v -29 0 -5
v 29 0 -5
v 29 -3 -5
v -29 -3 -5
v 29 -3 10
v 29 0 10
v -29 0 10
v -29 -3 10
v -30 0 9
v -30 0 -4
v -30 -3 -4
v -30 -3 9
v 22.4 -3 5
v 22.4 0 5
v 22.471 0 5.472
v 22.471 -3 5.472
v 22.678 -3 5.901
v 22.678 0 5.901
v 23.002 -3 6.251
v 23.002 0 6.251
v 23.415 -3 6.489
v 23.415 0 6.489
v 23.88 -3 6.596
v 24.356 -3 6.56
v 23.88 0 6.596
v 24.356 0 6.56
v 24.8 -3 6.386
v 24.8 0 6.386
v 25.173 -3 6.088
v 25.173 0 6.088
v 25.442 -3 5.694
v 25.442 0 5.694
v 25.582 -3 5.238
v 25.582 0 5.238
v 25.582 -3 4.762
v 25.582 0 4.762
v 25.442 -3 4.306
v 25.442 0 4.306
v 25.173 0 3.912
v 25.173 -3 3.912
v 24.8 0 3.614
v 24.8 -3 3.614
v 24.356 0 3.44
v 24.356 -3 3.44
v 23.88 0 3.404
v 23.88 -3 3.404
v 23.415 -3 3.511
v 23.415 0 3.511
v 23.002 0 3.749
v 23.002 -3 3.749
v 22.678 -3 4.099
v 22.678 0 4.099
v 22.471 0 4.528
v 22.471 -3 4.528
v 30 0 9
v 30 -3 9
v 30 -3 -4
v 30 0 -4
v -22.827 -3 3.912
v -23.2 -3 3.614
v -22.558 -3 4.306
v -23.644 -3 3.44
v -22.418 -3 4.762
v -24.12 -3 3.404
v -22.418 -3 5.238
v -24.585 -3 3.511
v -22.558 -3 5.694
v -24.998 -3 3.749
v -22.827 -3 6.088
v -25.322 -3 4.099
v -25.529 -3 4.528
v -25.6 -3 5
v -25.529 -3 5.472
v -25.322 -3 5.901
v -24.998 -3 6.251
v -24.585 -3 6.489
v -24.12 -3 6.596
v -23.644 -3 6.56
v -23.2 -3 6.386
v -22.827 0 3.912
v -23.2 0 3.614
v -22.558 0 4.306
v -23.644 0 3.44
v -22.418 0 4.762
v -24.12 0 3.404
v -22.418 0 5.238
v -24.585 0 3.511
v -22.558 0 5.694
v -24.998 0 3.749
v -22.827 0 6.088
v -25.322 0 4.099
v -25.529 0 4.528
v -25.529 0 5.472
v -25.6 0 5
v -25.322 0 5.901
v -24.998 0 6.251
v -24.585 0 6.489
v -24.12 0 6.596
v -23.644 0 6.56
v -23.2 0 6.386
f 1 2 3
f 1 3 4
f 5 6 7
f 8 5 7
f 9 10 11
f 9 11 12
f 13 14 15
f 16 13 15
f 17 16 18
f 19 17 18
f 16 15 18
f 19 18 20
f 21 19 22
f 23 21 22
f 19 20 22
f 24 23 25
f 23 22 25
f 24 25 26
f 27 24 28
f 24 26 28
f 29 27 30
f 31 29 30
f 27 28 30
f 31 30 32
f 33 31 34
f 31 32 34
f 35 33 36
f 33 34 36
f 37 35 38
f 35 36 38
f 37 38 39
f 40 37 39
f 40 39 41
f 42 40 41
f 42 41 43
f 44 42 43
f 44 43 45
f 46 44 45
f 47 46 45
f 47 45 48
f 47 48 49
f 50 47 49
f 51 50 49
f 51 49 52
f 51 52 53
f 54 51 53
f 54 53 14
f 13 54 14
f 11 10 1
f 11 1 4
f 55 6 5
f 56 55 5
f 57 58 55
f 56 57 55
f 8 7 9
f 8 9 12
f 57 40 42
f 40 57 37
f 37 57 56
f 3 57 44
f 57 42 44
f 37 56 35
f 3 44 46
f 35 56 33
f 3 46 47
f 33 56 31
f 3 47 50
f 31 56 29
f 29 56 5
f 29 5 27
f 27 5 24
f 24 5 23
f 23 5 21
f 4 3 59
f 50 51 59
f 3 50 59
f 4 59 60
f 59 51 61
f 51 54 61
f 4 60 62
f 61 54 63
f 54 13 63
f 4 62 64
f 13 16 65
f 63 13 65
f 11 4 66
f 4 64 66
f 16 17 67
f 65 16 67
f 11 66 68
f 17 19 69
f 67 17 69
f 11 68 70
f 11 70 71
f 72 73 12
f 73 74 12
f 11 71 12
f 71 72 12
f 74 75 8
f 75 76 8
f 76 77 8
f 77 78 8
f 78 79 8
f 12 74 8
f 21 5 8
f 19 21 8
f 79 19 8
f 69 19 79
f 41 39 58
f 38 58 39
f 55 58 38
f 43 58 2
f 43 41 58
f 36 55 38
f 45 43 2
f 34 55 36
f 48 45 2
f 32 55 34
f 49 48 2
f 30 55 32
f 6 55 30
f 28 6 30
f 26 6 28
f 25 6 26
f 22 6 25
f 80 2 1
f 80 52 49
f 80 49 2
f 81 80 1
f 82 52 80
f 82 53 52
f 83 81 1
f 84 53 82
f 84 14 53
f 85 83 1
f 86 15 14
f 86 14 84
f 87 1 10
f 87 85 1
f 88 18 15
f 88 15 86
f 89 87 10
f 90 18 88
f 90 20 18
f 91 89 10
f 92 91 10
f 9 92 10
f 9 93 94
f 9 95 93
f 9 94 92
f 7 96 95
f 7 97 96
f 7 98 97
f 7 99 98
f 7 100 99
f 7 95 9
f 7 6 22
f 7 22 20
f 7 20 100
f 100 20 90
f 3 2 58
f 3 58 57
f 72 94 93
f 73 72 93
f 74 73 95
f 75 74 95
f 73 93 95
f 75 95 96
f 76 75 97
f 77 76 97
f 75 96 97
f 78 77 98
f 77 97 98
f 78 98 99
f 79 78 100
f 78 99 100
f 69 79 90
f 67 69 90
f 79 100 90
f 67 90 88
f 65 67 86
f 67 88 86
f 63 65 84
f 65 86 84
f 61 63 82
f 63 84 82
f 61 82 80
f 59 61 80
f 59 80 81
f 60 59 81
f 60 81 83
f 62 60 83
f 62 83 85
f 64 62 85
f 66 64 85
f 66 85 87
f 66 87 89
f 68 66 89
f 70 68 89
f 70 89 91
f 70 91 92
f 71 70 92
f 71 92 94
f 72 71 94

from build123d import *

# Parameters (mm, degrees)
SKETCH001_W             = 60
SKETCH001_H             = 15
PAD001_DEPTH            = 3
CHAMFER_SIZE            = 1
SKETCH005_R             = 1.6
POCKET002_DEPTH         = 3.001
BODY001_PLACEMENT_ANGLE = 90.00001


with BuildPart() as part:
    # Sketch001 → Pad001 (new body)
    with BuildSketch(Plane.YZ):
        with Locations((0, 2.5)):
            Rectangle(SKETCH001_W, SKETCH001_H)
    extrude(amount=-PAD001_DEPTH)

    # Chamfer
    chamfer_edges = [part.edges().sort_by_distance(p)[0] for p in [
        (-1.5, 30, 10),
        (-1.5, -30, 10),
        (-1.5, -30, -5),
        (-1.5, 30, -5),
    ]]
    chamfer(chamfer_edges, length=CHAMFER_SIZE)

    # Sketch005 → Pocket002 (cut, through all)
    with BuildSketch(Plane.YZ):
        with Locations((-24, 5)):
            Circle(SKETCH005_R)
        with Locations((24, 5)):
            Circle(SKETCH005_R)
    extrude(amount=-POCKET002_DEPTH, mode=Mode.SUBTRACT)


with BuildPart() as part_1:
    # Body001 placement: moved
    add(part.part.rotate(Axis((0, 0, 0), (0, 0, 1)), BODY001_PLACEMENT_ANGLE))


solid = part_1.part
